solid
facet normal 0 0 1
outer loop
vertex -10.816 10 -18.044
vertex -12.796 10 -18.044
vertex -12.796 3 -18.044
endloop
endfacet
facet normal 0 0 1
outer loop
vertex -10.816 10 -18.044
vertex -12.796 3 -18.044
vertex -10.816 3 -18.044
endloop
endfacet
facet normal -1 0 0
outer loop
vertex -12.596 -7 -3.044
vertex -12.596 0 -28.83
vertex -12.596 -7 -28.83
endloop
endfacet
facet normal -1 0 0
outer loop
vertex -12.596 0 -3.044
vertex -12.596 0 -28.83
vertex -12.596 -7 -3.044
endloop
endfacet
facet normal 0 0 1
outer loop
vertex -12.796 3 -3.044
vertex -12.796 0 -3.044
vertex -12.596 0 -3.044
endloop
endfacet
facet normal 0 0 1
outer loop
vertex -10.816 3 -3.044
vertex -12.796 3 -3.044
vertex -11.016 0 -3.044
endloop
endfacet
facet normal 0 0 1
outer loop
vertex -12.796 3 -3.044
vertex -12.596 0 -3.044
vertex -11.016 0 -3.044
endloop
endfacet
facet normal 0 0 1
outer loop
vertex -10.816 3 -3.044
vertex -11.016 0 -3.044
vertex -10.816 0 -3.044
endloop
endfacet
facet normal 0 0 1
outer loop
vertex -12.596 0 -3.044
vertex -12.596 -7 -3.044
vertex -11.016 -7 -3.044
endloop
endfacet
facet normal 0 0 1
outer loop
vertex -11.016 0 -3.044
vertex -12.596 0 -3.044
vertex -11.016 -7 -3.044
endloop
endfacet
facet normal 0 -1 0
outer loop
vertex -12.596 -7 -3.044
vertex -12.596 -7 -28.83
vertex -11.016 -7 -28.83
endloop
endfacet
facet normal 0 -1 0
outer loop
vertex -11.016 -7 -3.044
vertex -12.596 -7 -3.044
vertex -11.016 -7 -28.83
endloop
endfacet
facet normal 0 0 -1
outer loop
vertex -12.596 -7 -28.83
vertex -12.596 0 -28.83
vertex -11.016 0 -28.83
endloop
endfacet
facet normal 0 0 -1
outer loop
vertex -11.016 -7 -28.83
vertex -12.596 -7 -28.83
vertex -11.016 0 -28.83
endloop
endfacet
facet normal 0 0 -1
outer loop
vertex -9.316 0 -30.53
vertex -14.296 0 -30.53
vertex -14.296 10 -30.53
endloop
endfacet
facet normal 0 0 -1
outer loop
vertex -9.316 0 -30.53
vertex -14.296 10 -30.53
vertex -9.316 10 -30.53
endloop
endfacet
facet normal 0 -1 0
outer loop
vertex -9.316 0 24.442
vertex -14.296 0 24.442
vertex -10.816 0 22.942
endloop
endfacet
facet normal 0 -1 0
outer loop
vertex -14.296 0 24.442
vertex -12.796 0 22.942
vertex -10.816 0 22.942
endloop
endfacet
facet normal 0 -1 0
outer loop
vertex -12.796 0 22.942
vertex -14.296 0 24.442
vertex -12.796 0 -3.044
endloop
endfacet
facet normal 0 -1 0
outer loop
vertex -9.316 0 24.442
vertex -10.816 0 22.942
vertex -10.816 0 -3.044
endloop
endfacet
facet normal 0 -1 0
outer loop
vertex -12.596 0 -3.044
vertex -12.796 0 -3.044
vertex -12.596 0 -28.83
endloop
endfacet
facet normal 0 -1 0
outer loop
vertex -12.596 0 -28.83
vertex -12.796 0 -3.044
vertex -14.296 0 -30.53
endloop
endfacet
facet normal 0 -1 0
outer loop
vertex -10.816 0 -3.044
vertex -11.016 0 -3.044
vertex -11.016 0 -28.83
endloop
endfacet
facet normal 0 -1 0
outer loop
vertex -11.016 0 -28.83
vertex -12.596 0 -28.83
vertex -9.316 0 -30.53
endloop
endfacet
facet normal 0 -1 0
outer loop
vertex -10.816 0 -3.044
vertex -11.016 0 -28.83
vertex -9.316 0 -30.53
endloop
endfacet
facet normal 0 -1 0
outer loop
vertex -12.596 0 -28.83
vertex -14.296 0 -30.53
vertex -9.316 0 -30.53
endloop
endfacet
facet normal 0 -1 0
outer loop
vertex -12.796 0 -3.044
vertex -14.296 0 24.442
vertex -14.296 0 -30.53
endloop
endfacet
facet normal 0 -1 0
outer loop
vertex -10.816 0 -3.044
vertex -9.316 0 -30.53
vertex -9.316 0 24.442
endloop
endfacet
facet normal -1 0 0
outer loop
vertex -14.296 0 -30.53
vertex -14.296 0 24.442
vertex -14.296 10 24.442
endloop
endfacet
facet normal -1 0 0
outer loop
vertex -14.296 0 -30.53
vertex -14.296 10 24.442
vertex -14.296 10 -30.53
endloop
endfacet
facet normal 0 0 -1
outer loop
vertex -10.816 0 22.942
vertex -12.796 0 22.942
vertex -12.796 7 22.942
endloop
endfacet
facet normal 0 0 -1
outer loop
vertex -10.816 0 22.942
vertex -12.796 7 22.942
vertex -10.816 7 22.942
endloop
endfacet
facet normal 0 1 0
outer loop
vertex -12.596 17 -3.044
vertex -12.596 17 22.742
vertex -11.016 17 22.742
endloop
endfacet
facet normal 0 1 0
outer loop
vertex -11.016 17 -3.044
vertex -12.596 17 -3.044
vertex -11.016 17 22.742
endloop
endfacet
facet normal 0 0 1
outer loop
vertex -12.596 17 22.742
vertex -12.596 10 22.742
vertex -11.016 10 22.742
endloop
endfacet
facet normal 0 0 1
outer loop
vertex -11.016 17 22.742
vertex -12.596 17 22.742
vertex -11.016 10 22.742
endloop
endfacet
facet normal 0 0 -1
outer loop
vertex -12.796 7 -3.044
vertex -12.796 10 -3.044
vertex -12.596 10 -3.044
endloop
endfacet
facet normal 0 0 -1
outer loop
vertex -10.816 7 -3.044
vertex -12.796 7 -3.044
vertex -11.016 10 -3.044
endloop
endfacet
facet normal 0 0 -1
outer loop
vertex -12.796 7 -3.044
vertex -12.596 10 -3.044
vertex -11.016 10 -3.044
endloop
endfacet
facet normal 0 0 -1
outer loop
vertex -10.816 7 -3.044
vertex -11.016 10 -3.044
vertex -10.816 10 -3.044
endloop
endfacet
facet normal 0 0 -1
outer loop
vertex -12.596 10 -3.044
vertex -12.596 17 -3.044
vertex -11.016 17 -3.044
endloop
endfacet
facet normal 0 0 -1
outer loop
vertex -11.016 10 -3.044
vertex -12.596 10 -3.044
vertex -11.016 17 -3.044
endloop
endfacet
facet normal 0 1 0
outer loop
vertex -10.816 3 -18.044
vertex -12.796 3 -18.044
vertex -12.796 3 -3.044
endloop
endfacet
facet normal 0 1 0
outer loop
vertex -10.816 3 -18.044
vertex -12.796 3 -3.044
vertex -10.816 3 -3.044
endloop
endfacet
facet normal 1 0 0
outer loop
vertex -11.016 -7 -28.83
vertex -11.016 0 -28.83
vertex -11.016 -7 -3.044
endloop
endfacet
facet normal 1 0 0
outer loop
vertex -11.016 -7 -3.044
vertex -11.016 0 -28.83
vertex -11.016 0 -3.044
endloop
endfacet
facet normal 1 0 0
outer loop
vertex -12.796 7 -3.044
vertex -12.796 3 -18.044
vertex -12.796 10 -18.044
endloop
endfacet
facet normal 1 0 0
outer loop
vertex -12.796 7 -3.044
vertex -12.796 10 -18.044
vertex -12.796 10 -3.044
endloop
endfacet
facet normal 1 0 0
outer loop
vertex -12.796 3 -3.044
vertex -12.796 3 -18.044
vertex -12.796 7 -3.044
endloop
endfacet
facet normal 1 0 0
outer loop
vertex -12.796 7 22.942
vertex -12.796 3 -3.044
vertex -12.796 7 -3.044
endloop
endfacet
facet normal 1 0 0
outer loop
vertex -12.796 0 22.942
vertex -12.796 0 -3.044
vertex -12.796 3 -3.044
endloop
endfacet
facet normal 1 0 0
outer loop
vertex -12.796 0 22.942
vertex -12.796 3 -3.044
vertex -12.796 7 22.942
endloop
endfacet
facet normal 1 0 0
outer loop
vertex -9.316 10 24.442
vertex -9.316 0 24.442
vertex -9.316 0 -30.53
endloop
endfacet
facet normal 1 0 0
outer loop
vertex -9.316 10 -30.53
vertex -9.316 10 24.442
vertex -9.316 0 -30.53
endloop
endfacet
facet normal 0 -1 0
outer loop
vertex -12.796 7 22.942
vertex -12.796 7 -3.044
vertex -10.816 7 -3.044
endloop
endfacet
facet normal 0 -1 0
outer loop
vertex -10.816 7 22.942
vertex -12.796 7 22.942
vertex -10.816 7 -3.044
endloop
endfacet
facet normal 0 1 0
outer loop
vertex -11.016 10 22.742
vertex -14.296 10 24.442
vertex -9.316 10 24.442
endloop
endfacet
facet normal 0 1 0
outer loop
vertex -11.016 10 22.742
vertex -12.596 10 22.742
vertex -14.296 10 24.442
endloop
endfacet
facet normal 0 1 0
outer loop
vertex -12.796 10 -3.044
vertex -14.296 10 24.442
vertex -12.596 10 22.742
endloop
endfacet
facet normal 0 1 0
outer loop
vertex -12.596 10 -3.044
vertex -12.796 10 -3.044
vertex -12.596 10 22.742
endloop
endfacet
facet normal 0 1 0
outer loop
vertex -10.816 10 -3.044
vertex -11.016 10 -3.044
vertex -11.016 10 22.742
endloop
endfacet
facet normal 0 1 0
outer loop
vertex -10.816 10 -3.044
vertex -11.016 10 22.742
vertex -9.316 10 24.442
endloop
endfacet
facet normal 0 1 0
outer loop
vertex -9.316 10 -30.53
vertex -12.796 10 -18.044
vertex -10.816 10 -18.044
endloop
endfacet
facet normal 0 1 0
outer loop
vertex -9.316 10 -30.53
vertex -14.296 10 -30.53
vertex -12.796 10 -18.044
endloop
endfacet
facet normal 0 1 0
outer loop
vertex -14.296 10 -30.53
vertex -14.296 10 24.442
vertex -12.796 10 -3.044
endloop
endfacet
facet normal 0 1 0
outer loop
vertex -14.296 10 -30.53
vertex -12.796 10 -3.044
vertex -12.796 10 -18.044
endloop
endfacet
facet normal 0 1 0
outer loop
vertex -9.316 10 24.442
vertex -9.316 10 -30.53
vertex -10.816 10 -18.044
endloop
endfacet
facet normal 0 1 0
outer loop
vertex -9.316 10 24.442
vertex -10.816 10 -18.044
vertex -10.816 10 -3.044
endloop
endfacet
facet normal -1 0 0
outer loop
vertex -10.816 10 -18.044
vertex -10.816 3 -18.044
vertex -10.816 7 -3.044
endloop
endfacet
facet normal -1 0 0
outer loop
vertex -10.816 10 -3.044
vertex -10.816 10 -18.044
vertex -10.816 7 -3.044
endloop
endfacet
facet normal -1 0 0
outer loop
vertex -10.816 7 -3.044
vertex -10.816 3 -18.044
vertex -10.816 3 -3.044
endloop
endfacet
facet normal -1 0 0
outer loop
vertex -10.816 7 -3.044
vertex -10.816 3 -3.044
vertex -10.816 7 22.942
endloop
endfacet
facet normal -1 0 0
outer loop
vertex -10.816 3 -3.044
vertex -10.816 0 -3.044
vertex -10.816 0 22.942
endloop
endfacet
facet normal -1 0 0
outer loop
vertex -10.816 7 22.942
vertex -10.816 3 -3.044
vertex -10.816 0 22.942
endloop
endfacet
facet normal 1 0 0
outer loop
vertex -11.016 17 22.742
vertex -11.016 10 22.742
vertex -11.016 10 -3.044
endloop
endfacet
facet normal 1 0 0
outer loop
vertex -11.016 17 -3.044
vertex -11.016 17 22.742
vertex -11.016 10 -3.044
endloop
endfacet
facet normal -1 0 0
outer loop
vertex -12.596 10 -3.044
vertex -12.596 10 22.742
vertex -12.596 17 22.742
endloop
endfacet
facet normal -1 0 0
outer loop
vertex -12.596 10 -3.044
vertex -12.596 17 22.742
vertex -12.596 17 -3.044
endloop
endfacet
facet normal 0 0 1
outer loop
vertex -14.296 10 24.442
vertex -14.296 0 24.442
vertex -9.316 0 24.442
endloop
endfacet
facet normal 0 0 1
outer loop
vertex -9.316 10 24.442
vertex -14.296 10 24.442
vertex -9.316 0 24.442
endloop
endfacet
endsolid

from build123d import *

# Parameters (mm, degrees)
SKETCH1_W           = 4.980670257
SKETCH1_H           = 54.9718421
BOSS_EXTRUDE1_DEPTH = 10
SKETCH2_W           = 1.980670257
SKETCH2_H           = 15
CUT_EXTRUDE2_DEPTH  = 7
SKETCH4_W           = 1.980670257
SKETCH4_H           = 25.98592105
CUT_EXTRUDE3_DEPTH  = 7
SKETCH5_W           = 1.580670257
SKETCH5_H           = 25.78592105
BOSS_EXTRUDE2_DEPTH = 7
SKETCH6_W           = 1.580670257
SKETCH6_H           = 25.78592105
BOSS_EXTRUDE3_DEPTH = 7


with BuildPart() as part:
    # Sketch1 → Boss-Extrude1 (new body)
    with BuildSketch(Plane(origin=(0, 0, 0), x_dir=(1, 0, 0), z_dir=(0, 1, 0))):
        with Locations((-11.806033203, 3.043742935)):
            Rectangle(SKETCH1_W, SKETCH1_H)
    extrude(amount=BOSS_EXTRUDE1_DEPTH)

    # Sketch2 → Cut-Extrude2 (cut)
    with BuildSketch(Plane(origin=(0, 10, 0), x_dir=(1, 0, 0), z_dir=(0, 1, 0))):
        with Locations((-11.806033203, 10.543742935)):
            Rectangle(SKETCH2_W, SKETCH2_H)
    extrude(amount=-CUT_EXTRUDE2_DEPTH, mode=Mode.SUBTRACT)

    # Sketch4 → Cut-Extrude3 (cut)
    with BuildSketch(Plane.XZ):
        with Locations((-11.806033203, 9.94921759)):
            Rectangle(SKETCH4_W, SKETCH4_H)
    extrude(amount=-CUT_EXTRUDE3_DEPTH, mode=Mode.SUBTRACT)

    # Sketch5 → Boss-Extrude2 (add)
    with BuildSketch(Plane.XZ):
        with Locations((-11.806033203, -15.93670346)):
            Rectangle(SKETCH5_W, SKETCH5_H)
    extrude(amount=BOSS_EXTRUDE2_DEPTH)

    # Sketch6 → Boss-Extrude3 (add)
    with BuildSketch(Plane(origin=(0, 10, 0), x_dir=(1, 0, 0), z_dir=(0, 1, 0))):
        with Locations((-11.806033203, -9.84921759)):
            Rectangle(SKETCH6_W, SKETCH6_H)
    extrude(amount=BOSS_EXTRUDE3_DEPTH)


solid = part.part
